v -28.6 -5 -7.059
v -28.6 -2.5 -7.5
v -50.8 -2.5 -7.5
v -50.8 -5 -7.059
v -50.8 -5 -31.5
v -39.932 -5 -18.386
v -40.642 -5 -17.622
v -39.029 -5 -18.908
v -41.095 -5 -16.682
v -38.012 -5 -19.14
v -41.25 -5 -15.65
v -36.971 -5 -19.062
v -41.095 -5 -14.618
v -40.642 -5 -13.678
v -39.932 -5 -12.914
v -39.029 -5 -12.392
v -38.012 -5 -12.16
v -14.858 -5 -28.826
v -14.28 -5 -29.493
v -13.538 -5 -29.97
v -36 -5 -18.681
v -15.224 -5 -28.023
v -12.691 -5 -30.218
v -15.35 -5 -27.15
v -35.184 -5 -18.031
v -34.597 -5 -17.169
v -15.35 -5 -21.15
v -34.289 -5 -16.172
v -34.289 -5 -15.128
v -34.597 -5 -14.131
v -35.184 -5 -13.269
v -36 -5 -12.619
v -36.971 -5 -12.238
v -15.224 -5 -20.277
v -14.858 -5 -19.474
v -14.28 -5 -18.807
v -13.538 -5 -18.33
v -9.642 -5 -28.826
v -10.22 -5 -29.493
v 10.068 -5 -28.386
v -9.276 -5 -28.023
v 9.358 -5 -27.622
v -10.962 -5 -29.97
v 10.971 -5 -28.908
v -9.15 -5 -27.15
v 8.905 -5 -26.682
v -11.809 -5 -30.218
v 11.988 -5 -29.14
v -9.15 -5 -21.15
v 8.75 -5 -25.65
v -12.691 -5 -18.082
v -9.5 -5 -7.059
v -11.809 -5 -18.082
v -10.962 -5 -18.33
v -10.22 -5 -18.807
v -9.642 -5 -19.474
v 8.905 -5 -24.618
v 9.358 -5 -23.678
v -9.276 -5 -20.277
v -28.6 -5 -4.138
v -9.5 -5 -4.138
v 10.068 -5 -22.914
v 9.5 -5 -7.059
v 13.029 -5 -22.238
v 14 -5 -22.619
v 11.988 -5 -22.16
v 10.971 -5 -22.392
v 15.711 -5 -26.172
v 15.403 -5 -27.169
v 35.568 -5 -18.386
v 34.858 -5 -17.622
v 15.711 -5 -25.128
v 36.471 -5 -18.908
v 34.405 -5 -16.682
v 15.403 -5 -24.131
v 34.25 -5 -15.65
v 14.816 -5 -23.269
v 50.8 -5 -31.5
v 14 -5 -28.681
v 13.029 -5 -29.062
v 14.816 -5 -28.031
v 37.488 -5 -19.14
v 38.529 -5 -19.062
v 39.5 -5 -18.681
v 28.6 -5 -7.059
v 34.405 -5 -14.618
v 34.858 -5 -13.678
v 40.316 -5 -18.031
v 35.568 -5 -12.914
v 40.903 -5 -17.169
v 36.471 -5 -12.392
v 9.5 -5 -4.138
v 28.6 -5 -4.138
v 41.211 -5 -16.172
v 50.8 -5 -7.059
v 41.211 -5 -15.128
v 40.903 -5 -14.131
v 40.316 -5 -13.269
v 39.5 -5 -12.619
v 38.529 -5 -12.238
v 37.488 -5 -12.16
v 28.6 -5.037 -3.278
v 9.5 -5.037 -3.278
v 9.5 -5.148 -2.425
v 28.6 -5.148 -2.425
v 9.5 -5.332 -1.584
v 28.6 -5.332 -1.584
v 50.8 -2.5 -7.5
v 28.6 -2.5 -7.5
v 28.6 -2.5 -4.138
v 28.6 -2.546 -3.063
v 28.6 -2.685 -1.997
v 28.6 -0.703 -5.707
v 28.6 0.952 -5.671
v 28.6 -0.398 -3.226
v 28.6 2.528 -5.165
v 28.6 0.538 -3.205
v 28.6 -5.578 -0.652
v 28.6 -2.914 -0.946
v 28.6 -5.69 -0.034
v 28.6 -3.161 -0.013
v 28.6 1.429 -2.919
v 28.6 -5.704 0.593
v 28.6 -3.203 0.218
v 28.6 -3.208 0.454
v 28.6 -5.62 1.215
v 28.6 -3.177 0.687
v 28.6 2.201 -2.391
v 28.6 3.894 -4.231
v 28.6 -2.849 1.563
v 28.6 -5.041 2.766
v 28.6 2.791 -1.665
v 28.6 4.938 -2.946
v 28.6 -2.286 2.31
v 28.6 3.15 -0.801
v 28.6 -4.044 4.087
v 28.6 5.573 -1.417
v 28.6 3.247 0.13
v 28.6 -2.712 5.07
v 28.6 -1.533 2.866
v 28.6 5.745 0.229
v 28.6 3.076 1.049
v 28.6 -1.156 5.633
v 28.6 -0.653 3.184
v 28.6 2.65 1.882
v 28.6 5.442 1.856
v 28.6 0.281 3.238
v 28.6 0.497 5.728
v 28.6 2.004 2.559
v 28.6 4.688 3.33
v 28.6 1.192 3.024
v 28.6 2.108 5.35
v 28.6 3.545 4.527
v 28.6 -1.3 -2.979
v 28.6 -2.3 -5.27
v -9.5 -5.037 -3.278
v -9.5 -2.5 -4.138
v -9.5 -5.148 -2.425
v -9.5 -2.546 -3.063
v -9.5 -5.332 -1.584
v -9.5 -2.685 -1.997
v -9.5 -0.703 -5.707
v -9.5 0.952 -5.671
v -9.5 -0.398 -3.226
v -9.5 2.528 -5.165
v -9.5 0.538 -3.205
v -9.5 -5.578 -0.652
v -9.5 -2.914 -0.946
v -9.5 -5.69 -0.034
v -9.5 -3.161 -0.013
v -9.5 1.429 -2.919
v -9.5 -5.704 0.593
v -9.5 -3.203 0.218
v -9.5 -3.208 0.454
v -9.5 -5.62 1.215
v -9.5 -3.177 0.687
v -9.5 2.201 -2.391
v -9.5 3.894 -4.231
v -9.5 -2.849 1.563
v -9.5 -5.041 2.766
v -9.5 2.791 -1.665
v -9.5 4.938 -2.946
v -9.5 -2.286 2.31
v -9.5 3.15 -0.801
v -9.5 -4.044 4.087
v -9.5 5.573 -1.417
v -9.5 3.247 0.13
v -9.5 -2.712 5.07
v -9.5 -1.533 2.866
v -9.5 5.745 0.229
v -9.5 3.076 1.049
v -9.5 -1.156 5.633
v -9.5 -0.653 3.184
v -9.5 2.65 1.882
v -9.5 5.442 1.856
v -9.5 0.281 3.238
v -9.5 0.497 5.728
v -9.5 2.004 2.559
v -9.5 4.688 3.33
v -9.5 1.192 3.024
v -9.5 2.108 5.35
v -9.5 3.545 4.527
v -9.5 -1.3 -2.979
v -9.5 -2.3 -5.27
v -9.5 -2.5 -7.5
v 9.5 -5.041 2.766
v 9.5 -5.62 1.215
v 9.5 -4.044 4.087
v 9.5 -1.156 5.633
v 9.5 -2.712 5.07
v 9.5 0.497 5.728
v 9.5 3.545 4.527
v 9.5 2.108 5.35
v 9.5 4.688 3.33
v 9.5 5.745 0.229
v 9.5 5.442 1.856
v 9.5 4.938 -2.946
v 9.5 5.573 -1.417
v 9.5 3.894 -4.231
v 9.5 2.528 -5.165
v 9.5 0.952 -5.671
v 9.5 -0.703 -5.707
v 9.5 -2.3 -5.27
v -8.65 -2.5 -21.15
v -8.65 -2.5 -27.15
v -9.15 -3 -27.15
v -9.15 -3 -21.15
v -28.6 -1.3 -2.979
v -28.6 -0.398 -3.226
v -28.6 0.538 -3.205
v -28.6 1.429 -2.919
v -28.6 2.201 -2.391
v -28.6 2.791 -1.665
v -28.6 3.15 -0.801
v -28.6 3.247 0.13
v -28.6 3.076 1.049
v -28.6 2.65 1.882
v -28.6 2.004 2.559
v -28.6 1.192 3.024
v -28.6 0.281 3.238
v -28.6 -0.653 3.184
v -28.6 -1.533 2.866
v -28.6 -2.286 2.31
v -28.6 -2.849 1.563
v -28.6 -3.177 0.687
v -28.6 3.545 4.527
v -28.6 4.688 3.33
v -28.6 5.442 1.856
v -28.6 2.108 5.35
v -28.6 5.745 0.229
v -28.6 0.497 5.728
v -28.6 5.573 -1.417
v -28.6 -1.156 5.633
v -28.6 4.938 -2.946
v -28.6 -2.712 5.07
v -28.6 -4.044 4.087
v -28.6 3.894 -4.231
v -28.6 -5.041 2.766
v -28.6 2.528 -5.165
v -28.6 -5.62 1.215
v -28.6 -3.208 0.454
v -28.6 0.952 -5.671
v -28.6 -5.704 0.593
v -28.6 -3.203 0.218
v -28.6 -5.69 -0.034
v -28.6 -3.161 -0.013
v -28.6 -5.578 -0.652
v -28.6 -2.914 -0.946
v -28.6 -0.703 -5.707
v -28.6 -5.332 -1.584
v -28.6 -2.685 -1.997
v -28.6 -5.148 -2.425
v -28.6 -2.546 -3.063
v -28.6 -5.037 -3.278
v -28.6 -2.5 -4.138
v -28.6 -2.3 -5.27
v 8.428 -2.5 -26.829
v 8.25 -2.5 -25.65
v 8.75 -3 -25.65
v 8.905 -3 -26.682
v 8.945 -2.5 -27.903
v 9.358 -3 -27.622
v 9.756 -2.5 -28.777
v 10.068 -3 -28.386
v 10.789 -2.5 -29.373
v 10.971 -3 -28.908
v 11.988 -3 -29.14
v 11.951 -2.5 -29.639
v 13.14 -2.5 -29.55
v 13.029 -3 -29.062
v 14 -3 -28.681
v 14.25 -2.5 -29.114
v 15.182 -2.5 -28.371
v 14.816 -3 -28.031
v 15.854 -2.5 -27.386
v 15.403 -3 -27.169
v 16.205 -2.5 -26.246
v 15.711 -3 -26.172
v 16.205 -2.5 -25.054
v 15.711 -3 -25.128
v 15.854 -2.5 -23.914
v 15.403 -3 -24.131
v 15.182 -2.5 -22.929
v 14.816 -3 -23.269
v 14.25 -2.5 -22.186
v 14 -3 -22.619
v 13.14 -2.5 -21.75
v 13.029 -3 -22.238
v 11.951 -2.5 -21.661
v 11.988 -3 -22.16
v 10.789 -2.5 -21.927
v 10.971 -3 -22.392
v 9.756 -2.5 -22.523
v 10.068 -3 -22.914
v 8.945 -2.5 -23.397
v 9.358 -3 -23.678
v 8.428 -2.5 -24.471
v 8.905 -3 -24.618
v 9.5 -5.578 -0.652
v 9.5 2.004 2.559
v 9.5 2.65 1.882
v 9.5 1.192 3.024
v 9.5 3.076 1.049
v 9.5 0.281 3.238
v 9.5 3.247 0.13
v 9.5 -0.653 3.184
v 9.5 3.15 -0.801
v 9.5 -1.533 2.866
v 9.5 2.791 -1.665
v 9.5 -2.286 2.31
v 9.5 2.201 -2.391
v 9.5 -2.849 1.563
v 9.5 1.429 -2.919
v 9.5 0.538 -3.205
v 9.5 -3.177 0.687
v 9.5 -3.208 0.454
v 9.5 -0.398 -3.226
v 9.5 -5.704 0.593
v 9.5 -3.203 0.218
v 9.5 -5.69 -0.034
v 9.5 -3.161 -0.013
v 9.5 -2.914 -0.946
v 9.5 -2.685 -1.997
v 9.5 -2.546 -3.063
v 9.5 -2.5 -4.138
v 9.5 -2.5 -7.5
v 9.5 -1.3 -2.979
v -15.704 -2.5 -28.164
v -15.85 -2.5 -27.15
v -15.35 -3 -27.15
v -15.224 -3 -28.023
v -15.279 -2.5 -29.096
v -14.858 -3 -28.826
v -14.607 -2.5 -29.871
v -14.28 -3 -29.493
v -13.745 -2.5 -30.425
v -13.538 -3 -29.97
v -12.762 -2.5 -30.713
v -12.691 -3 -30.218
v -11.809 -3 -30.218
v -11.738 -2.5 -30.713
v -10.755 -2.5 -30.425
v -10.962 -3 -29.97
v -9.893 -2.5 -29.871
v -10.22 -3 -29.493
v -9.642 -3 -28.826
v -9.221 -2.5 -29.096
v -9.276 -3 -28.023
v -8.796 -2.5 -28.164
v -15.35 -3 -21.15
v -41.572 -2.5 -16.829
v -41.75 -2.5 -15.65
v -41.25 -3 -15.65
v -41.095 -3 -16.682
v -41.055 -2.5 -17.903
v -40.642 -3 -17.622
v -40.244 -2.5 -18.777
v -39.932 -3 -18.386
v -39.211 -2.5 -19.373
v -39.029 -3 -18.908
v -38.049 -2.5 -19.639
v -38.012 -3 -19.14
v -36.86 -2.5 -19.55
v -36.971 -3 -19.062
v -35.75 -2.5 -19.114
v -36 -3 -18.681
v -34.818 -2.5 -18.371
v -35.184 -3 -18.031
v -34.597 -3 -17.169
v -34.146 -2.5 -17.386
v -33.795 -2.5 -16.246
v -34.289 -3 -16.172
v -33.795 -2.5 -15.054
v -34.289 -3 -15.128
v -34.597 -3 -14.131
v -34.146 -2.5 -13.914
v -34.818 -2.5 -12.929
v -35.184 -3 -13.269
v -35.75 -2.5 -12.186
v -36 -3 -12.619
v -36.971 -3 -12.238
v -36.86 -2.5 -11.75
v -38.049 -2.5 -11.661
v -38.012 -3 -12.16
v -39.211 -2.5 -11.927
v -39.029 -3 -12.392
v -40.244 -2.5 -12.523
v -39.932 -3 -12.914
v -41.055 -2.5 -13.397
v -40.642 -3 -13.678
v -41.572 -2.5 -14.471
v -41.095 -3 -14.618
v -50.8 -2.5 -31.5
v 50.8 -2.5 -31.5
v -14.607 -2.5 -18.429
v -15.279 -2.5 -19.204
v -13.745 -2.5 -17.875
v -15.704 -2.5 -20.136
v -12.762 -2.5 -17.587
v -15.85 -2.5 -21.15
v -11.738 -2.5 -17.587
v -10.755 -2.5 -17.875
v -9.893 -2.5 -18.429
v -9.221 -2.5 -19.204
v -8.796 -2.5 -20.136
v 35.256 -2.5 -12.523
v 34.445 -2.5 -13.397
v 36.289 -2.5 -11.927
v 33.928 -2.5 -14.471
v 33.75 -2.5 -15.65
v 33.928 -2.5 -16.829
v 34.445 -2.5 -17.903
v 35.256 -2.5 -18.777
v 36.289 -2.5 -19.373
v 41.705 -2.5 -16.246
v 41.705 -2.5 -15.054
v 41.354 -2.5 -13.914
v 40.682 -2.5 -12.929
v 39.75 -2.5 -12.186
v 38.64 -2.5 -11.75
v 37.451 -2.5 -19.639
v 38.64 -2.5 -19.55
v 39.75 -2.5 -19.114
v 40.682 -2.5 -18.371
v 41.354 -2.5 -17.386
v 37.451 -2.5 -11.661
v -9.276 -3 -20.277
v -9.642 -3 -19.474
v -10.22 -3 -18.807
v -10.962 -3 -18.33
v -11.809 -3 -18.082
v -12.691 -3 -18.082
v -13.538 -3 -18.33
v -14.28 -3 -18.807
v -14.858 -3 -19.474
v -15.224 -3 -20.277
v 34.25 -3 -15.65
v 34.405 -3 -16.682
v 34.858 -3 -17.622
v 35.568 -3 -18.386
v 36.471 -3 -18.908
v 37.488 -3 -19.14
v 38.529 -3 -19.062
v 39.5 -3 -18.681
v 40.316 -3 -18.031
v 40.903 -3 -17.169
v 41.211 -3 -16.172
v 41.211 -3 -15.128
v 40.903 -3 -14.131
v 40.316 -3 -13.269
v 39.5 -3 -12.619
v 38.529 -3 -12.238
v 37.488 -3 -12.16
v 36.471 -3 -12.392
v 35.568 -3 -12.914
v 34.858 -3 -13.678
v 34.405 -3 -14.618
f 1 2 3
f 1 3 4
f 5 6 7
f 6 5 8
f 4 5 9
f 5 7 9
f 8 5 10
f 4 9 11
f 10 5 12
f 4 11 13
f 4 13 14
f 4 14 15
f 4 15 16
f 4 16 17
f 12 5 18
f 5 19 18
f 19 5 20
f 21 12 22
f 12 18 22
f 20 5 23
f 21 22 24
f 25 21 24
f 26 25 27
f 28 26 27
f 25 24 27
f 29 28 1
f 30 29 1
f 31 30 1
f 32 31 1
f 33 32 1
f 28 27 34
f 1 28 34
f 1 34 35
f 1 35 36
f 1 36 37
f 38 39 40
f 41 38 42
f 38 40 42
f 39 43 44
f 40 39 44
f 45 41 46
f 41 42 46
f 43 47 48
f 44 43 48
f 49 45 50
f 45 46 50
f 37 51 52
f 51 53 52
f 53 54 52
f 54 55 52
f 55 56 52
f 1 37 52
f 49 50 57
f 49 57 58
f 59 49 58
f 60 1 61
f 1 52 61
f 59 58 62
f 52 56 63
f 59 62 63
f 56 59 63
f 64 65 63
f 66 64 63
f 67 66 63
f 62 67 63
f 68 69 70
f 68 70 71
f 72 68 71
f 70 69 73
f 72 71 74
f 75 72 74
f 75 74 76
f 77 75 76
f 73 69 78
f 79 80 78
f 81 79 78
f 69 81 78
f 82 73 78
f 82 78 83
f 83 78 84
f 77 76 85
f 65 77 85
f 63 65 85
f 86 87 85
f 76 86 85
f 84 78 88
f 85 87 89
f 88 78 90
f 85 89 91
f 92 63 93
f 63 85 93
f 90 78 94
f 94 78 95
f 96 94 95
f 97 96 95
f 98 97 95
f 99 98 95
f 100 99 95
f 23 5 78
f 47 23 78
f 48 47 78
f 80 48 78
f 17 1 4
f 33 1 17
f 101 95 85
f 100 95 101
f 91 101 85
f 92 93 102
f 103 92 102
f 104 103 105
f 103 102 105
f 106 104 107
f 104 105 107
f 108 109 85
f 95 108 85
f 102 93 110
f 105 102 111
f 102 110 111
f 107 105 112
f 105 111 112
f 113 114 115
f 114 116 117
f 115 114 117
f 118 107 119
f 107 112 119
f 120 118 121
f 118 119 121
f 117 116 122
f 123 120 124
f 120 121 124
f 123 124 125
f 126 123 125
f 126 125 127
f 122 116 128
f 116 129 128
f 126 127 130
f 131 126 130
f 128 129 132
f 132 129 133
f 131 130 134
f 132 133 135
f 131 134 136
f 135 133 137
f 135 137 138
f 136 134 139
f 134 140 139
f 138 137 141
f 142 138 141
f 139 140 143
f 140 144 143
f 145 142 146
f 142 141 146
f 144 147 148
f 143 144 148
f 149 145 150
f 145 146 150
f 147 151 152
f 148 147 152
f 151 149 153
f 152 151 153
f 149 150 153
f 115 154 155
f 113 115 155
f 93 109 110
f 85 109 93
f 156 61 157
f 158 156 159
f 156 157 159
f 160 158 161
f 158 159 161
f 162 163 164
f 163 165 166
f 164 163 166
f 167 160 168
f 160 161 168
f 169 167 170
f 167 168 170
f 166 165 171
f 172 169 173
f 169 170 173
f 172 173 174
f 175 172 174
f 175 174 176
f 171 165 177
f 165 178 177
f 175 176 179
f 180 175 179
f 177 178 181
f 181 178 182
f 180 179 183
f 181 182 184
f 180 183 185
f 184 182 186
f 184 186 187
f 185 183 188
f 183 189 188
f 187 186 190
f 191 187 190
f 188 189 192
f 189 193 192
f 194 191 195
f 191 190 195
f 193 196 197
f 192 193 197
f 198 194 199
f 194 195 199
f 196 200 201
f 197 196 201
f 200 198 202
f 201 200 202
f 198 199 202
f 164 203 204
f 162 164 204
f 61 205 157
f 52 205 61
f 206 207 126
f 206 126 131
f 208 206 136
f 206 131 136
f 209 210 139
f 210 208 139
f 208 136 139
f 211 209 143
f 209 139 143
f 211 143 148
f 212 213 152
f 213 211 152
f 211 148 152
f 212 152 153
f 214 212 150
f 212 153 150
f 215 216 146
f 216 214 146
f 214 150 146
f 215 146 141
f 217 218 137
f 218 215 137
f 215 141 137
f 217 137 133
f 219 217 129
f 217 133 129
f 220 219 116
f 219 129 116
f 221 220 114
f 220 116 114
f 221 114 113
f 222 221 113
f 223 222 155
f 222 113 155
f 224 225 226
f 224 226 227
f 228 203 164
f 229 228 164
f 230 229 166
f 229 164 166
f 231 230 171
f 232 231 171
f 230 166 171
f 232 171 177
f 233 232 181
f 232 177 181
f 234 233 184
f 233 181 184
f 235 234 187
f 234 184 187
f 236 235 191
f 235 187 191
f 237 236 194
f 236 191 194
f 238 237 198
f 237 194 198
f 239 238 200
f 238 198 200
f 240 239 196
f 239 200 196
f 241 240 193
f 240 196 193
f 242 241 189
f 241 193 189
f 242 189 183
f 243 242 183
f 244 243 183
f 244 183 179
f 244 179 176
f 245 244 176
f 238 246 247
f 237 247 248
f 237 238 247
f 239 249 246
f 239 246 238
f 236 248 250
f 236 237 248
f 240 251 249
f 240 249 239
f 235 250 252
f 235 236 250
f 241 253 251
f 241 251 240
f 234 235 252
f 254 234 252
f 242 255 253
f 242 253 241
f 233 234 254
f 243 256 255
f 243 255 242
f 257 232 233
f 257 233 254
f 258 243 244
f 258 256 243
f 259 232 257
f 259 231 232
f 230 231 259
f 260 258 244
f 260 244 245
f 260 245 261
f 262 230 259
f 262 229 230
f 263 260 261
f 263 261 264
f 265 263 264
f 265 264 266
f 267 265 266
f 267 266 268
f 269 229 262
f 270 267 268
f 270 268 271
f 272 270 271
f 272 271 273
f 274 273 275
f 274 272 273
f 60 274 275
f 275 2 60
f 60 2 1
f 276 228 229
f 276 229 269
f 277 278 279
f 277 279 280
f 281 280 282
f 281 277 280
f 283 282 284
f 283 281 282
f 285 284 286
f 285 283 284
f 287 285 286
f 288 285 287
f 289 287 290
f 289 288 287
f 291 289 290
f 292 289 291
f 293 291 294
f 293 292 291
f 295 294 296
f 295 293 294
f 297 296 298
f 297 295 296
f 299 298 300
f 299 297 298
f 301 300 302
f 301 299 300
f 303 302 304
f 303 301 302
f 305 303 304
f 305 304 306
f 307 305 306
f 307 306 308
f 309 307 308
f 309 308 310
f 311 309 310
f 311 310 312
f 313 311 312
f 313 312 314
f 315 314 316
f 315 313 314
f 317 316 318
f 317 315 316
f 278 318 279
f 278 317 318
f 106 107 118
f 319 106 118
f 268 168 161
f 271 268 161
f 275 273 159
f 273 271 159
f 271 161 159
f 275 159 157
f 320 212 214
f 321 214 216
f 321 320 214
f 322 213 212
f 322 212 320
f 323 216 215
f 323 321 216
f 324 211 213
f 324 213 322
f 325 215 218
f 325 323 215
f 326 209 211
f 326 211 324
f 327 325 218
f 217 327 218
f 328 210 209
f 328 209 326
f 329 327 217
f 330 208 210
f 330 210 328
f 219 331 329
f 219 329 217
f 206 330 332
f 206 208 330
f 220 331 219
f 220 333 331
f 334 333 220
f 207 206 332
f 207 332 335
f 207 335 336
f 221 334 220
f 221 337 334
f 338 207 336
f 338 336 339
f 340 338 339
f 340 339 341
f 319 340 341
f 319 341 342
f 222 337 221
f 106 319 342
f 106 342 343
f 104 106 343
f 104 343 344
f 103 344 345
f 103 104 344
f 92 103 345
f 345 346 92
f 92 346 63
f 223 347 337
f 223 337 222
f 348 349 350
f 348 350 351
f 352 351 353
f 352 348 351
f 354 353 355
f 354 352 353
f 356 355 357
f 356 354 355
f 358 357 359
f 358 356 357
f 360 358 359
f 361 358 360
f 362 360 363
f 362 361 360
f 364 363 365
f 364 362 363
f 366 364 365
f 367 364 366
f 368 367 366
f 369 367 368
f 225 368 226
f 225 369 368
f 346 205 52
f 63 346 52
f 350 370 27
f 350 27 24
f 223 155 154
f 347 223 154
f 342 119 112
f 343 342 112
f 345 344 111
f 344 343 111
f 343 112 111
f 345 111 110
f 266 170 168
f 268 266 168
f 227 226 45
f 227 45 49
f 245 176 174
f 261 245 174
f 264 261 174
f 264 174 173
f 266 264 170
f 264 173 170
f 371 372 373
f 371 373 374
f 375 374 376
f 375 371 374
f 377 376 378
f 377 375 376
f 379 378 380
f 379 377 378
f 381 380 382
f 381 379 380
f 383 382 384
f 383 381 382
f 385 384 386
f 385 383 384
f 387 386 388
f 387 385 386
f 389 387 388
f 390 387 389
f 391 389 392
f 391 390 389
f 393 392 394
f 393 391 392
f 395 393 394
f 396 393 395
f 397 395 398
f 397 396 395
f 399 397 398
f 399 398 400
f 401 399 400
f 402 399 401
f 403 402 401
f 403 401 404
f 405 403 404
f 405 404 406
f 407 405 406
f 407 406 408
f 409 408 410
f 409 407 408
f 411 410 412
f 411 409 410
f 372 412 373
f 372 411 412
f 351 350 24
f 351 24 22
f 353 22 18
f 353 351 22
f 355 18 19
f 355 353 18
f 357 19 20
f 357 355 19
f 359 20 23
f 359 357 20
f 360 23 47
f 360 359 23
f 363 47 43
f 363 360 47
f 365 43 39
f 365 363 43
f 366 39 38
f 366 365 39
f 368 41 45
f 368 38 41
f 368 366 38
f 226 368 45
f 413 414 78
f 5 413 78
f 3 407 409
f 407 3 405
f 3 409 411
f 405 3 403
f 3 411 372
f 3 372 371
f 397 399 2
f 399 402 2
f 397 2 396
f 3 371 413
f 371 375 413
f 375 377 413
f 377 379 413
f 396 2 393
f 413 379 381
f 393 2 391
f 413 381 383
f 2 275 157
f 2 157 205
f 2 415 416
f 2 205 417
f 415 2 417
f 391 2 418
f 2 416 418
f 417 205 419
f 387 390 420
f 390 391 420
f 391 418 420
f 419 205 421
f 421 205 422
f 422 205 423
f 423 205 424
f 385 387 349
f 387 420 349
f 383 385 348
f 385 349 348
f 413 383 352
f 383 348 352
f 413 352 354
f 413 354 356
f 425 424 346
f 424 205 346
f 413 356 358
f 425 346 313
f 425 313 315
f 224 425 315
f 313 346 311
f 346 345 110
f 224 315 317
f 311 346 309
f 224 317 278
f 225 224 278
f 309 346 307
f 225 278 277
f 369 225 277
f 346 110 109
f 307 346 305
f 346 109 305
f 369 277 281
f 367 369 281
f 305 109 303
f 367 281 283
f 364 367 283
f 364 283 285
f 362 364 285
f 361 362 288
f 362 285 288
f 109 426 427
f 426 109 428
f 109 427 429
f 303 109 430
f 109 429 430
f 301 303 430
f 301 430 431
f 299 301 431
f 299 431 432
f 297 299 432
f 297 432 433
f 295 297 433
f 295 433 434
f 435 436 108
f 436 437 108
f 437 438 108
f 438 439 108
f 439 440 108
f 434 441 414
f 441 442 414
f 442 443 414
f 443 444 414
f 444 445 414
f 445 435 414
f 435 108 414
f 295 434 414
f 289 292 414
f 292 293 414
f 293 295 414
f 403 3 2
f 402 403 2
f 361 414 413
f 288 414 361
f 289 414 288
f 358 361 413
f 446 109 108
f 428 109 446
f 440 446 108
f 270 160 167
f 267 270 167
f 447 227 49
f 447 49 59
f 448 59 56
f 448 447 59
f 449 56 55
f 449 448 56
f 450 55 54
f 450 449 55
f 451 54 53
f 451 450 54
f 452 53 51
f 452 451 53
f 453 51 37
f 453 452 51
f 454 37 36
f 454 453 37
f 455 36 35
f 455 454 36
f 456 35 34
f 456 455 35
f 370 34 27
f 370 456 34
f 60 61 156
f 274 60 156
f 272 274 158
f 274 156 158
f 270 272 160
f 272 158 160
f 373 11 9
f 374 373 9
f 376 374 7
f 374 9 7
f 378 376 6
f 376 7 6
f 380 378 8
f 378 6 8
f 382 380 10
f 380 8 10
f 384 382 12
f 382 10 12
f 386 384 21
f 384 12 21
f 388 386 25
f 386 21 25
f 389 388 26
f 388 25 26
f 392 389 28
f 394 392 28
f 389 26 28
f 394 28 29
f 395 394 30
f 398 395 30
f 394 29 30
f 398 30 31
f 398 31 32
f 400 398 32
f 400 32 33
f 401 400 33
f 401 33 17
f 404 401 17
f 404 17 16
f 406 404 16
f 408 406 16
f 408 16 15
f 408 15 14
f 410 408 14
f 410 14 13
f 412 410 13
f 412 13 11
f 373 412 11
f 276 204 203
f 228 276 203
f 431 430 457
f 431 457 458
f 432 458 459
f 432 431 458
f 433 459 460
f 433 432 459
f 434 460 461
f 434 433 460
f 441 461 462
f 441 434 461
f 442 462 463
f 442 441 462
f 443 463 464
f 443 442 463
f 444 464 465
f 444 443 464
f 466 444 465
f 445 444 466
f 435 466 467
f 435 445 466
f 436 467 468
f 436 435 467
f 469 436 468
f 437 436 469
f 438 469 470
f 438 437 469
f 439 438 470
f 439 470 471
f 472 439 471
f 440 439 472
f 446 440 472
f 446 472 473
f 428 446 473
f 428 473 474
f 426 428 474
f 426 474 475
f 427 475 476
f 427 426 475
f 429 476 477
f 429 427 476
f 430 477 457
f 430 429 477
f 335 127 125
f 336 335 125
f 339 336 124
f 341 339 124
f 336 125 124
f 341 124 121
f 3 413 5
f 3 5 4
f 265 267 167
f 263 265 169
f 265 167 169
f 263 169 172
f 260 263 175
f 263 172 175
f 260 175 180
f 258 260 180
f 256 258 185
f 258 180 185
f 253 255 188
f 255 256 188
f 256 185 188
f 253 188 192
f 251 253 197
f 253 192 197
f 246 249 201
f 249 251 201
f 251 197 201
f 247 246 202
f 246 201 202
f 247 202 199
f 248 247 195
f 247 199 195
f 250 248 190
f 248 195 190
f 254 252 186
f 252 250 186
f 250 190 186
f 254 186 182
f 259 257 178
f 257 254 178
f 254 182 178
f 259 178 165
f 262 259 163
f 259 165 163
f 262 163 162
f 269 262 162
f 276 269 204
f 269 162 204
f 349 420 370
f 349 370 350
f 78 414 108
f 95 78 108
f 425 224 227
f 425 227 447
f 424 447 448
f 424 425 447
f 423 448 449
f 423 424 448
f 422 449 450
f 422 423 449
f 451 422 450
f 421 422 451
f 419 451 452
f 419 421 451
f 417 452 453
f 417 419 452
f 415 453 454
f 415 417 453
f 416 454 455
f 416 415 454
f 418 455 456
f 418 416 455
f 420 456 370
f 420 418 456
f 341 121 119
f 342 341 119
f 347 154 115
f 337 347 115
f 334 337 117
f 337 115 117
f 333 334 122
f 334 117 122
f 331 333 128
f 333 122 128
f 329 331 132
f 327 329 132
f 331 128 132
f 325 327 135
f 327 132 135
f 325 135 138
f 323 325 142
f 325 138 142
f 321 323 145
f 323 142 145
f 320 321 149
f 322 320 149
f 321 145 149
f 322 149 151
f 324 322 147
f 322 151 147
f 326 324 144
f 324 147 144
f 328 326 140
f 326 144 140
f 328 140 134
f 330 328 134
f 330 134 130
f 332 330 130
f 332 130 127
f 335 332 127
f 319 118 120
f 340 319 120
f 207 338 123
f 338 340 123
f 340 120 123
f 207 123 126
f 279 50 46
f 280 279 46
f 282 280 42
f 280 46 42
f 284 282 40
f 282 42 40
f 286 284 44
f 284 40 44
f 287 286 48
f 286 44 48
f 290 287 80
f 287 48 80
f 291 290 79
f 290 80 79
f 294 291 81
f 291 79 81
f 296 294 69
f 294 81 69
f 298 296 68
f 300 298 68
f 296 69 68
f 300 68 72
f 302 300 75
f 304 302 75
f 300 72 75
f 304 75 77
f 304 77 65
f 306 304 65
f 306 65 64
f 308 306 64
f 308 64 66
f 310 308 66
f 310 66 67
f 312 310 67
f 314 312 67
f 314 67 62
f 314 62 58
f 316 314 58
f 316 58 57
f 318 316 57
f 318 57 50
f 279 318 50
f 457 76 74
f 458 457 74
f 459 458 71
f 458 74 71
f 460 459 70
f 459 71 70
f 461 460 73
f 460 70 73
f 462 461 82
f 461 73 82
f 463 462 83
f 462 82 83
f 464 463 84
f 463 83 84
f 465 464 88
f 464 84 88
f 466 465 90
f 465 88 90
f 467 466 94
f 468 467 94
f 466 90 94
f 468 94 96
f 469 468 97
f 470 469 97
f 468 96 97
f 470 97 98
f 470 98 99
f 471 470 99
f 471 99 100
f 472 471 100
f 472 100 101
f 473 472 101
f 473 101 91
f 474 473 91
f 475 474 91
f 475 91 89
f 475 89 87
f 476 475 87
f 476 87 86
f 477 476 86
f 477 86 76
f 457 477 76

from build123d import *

# Parameters (mm, degrees)
BASE_FLANGE1_DEPTH           = 50.8
CUT_EXTRUDE1_DEPTH           = 61.049583679
CUT_EXTRUDE1_DEPTH_BACK      = 61.049583679
SKETCH6_W                    = 22.2
SKETCH6_H                    = 40.396012785
SKETCH6_W_2                  = 19
F_7_0_7_DIAMETER_HOLE1_D     = 7
F_7_0_7_DIAMETER_HOLE1_DEPTH = 10
F_7_0_7_DIAMETER_HOLE1_TIP   = 2.103012167
CUT_EXTRUDE2_DEPTH           = 10
CHAMFER1_SIZE                = 0.5
CHAMFER2_SIZE                = 0.5
CHAMFER2_SIZE_2              = 2.83564091


# Sheet-metal steps are written as plain solids
with BuildPart() as part:
    # Sketch1 → Base-Flange1 (new, symmetric)
    with BuildSketch(Plane(origin=(0, 0, 0), x_dir=(0, 0, -1), z_dir=(1, 0, 0))):
        with BuildLine():
            Line((31.5, -5), (4.137865616, -5))
            ThreePointArc((4.137865616, -5), (2.850262482, -5.083242558), (1.584096024, -5.331584366))
            Line((1.584096024, -5.331584366), (0.651734752, -5.577853864))
            ThreePointArc((0.651734752, -5.577853864), (-0.279113067, -5.709460074), (-1.214968707, -5.620173577))
            ThreePointArc((-1.214968707, -5.620173577), (-2.620425709, 5.118190022), (5.269962049, -2.3))
            Line((5.269962049, -2.3), (2.978674202, -1.3))
            ThreePointArc((2.978674202, -1.3), (-1.481110183, 2.892890013), (-0.686721443, -3.176619848))
            ThreePointArc((-0.686721443, -3.176619848), (-0.335775578, -3.210102284), (0.013292354, -3.160749956))
            Line((0.013292354, -3.160749956), (0.945653625, -2.914480458))
            ThreePointArc((0.945653625, -2.914480458), (2.528361698, -2.604053197), (4.137865616, -2.5))
            Line((4.137865616, -2.5), (31.5, -2.5))
            Line((31.5, -2.5), (31.5, -5))
        make_face()
    extrude(amount=BASE_FLANGE1_DEPTH, both=True)

    # Sketch6 → Cut-Extrude1 (cut, two sides: drawn at the far end of the back side and taken through both)
    with BuildSketch(Plane(origin=(0, 0, 0), x_dir=(1, 0, 0), z_dir=(0, 1, 0)).offset(-CUT_EXTRUDE1_DEPTH_BACK)):
        with Locations((-39.7, -13.198006393)):
            Rectangle(SKETCH6_W, SKETCH6_H)
        with Locations((39.7, -13.198006393)):
            Rectangle(SKETCH6_W, SKETCH6_H)
        with Locations((0, -13.198006393)):
            Rectangle(SKETCH6_W_2, SKETCH6_H)
    extrude(amount=CUT_EXTRUDE1_DEPTH + CUT_EXTRUDE1_DEPTH_BACK, mode=Mode.SUBTRACT)

    # Ø7.0 (7) Diameter Hole1
    with Locations(Plane(origin=(0, -2.5, 0), x_dir=(1, 0, 0), z_dir=(0, 1, 0))):
        with Locations((37.75, 15.65), (-37.75, 15.65), (12.25, 25.65)):
            Hole(F_7_0_7_DIAMETER_HOLE1_D / 2, depth=F_7_0_7_DIAMETER_HOLE1_DEPTH)
            with Locations((0, 0, -(F_7_0_7_DIAMETER_HOLE1_DEPTH + F_7_0_7_DIAMETER_HOLE1_TIP / 2))):  # 118° drill point
                Cone(0, F_7_0_7_DIAMETER_HOLE1_D / 2, F_7_0_7_DIAMETER_HOLE1_TIP, mode=Mode.SUBTRACT)

    # Sketch9 → Cut-Extrude2 (cut)
    with BuildSketch(Plane(origin=(0, -2.5, 0), x_dir=(1, 0, 0), z_dir=(0, 1, 0))):
        with BuildLine():
            Line((-9.15, 27.15), (-9.15, 21.15))
            ThreePointArc((-9.15, 21.15), (-12.25, 18.05), (-15.35, 21.15))
            Line((-15.35, 21.15), (-15.35, 27.15))
            ThreePointArc((-15.35, 27.15), (-12.25, 30.25), (-9.15, 27.15))
        make_face()
    extrude(amount=-CUT_EXTRUDE2_DEPTH, mode=Mode.SUBTRACT)

    # Chamfer1
    chamfer1_edges = [part.edges().sort_by_distance(p)[0] for p in [
        (15.75, -2.5, -25.65),
        (-34.25, -2.5, -15.65),
        (41.25, -2.5, -15.65),
        (-12.25, -2.5, -30.25),
        (-15.35, -2.5, -24.15),
        (-12.25, -2.5, -18.05),
        (-9.15, -2.5, -24.15),
    ]]
    chamfer(chamfer1_edges, length=CHAMFER1_SIZE)

    # Chamfer2
    # the kernel refuses this chamfer: 2.83564091, 0.5 mm, written as the material it takes off along each edge
    with BuildSketch(Plane(origin=(-28.6, -2.5, -7), x_dir=(0, 0.21013876076743535, -0.9776715712462578), z_dir=(-1, 0, 0))) as chamfer2_piece_1:
        Polygon((CHAMFER2_SIZE * 0.977671571246, CHAMFER2_SIZE * 0.210138760767), (-CHAMFER2_SIZE_2 * 0.210138760753, CHAMFER2_SIZE_2 * 0.97767157118), (0, 0), align=None)
    extrude(amount=29.568522917, mode=Mode.SUBTRACT)
    with BuildSketch(Plane(origin=(-9.5, -2.5, -7), x_dir=(0, 0.21013876076743535, -0.9776715712462578), z_dir=(1, 0, 0))) as chamfer2_piece_2:
        Polygon((CHAMFER2_SIZE * 0.977671571246, -CHAMFER2_SIZE * 0.210138760767), (-CHAMFER2_SIZE_2 * 0.210138760753, -CHAMFER2_SIZE_2 * 0.97767157118), (0, 0), align=None)
    extrude(amount=19, mode=Mode.SUBTRACT)
    with BuildSketch(Plane(origin=(28.6, -2.5, -7), x_dir=(0, 0.21013876076743535, -0.9776715712462578), z_dir=(1, 0, 0))) as chamfer2_piece_3:
        Polygon((CHAMFER2_SIZE * 0.977671571246, -CHAMFER2_SIZE * 0.210138760767), (-CHAMFER2_SIZE_2 * 0.210138760753, -CHAMFER2_SIZE_2 * 0.97767157118), (0, 0), align=None)
    extrude(amount=29.568522917, mode=Mode.SUBTRACT)


solid = part.part
